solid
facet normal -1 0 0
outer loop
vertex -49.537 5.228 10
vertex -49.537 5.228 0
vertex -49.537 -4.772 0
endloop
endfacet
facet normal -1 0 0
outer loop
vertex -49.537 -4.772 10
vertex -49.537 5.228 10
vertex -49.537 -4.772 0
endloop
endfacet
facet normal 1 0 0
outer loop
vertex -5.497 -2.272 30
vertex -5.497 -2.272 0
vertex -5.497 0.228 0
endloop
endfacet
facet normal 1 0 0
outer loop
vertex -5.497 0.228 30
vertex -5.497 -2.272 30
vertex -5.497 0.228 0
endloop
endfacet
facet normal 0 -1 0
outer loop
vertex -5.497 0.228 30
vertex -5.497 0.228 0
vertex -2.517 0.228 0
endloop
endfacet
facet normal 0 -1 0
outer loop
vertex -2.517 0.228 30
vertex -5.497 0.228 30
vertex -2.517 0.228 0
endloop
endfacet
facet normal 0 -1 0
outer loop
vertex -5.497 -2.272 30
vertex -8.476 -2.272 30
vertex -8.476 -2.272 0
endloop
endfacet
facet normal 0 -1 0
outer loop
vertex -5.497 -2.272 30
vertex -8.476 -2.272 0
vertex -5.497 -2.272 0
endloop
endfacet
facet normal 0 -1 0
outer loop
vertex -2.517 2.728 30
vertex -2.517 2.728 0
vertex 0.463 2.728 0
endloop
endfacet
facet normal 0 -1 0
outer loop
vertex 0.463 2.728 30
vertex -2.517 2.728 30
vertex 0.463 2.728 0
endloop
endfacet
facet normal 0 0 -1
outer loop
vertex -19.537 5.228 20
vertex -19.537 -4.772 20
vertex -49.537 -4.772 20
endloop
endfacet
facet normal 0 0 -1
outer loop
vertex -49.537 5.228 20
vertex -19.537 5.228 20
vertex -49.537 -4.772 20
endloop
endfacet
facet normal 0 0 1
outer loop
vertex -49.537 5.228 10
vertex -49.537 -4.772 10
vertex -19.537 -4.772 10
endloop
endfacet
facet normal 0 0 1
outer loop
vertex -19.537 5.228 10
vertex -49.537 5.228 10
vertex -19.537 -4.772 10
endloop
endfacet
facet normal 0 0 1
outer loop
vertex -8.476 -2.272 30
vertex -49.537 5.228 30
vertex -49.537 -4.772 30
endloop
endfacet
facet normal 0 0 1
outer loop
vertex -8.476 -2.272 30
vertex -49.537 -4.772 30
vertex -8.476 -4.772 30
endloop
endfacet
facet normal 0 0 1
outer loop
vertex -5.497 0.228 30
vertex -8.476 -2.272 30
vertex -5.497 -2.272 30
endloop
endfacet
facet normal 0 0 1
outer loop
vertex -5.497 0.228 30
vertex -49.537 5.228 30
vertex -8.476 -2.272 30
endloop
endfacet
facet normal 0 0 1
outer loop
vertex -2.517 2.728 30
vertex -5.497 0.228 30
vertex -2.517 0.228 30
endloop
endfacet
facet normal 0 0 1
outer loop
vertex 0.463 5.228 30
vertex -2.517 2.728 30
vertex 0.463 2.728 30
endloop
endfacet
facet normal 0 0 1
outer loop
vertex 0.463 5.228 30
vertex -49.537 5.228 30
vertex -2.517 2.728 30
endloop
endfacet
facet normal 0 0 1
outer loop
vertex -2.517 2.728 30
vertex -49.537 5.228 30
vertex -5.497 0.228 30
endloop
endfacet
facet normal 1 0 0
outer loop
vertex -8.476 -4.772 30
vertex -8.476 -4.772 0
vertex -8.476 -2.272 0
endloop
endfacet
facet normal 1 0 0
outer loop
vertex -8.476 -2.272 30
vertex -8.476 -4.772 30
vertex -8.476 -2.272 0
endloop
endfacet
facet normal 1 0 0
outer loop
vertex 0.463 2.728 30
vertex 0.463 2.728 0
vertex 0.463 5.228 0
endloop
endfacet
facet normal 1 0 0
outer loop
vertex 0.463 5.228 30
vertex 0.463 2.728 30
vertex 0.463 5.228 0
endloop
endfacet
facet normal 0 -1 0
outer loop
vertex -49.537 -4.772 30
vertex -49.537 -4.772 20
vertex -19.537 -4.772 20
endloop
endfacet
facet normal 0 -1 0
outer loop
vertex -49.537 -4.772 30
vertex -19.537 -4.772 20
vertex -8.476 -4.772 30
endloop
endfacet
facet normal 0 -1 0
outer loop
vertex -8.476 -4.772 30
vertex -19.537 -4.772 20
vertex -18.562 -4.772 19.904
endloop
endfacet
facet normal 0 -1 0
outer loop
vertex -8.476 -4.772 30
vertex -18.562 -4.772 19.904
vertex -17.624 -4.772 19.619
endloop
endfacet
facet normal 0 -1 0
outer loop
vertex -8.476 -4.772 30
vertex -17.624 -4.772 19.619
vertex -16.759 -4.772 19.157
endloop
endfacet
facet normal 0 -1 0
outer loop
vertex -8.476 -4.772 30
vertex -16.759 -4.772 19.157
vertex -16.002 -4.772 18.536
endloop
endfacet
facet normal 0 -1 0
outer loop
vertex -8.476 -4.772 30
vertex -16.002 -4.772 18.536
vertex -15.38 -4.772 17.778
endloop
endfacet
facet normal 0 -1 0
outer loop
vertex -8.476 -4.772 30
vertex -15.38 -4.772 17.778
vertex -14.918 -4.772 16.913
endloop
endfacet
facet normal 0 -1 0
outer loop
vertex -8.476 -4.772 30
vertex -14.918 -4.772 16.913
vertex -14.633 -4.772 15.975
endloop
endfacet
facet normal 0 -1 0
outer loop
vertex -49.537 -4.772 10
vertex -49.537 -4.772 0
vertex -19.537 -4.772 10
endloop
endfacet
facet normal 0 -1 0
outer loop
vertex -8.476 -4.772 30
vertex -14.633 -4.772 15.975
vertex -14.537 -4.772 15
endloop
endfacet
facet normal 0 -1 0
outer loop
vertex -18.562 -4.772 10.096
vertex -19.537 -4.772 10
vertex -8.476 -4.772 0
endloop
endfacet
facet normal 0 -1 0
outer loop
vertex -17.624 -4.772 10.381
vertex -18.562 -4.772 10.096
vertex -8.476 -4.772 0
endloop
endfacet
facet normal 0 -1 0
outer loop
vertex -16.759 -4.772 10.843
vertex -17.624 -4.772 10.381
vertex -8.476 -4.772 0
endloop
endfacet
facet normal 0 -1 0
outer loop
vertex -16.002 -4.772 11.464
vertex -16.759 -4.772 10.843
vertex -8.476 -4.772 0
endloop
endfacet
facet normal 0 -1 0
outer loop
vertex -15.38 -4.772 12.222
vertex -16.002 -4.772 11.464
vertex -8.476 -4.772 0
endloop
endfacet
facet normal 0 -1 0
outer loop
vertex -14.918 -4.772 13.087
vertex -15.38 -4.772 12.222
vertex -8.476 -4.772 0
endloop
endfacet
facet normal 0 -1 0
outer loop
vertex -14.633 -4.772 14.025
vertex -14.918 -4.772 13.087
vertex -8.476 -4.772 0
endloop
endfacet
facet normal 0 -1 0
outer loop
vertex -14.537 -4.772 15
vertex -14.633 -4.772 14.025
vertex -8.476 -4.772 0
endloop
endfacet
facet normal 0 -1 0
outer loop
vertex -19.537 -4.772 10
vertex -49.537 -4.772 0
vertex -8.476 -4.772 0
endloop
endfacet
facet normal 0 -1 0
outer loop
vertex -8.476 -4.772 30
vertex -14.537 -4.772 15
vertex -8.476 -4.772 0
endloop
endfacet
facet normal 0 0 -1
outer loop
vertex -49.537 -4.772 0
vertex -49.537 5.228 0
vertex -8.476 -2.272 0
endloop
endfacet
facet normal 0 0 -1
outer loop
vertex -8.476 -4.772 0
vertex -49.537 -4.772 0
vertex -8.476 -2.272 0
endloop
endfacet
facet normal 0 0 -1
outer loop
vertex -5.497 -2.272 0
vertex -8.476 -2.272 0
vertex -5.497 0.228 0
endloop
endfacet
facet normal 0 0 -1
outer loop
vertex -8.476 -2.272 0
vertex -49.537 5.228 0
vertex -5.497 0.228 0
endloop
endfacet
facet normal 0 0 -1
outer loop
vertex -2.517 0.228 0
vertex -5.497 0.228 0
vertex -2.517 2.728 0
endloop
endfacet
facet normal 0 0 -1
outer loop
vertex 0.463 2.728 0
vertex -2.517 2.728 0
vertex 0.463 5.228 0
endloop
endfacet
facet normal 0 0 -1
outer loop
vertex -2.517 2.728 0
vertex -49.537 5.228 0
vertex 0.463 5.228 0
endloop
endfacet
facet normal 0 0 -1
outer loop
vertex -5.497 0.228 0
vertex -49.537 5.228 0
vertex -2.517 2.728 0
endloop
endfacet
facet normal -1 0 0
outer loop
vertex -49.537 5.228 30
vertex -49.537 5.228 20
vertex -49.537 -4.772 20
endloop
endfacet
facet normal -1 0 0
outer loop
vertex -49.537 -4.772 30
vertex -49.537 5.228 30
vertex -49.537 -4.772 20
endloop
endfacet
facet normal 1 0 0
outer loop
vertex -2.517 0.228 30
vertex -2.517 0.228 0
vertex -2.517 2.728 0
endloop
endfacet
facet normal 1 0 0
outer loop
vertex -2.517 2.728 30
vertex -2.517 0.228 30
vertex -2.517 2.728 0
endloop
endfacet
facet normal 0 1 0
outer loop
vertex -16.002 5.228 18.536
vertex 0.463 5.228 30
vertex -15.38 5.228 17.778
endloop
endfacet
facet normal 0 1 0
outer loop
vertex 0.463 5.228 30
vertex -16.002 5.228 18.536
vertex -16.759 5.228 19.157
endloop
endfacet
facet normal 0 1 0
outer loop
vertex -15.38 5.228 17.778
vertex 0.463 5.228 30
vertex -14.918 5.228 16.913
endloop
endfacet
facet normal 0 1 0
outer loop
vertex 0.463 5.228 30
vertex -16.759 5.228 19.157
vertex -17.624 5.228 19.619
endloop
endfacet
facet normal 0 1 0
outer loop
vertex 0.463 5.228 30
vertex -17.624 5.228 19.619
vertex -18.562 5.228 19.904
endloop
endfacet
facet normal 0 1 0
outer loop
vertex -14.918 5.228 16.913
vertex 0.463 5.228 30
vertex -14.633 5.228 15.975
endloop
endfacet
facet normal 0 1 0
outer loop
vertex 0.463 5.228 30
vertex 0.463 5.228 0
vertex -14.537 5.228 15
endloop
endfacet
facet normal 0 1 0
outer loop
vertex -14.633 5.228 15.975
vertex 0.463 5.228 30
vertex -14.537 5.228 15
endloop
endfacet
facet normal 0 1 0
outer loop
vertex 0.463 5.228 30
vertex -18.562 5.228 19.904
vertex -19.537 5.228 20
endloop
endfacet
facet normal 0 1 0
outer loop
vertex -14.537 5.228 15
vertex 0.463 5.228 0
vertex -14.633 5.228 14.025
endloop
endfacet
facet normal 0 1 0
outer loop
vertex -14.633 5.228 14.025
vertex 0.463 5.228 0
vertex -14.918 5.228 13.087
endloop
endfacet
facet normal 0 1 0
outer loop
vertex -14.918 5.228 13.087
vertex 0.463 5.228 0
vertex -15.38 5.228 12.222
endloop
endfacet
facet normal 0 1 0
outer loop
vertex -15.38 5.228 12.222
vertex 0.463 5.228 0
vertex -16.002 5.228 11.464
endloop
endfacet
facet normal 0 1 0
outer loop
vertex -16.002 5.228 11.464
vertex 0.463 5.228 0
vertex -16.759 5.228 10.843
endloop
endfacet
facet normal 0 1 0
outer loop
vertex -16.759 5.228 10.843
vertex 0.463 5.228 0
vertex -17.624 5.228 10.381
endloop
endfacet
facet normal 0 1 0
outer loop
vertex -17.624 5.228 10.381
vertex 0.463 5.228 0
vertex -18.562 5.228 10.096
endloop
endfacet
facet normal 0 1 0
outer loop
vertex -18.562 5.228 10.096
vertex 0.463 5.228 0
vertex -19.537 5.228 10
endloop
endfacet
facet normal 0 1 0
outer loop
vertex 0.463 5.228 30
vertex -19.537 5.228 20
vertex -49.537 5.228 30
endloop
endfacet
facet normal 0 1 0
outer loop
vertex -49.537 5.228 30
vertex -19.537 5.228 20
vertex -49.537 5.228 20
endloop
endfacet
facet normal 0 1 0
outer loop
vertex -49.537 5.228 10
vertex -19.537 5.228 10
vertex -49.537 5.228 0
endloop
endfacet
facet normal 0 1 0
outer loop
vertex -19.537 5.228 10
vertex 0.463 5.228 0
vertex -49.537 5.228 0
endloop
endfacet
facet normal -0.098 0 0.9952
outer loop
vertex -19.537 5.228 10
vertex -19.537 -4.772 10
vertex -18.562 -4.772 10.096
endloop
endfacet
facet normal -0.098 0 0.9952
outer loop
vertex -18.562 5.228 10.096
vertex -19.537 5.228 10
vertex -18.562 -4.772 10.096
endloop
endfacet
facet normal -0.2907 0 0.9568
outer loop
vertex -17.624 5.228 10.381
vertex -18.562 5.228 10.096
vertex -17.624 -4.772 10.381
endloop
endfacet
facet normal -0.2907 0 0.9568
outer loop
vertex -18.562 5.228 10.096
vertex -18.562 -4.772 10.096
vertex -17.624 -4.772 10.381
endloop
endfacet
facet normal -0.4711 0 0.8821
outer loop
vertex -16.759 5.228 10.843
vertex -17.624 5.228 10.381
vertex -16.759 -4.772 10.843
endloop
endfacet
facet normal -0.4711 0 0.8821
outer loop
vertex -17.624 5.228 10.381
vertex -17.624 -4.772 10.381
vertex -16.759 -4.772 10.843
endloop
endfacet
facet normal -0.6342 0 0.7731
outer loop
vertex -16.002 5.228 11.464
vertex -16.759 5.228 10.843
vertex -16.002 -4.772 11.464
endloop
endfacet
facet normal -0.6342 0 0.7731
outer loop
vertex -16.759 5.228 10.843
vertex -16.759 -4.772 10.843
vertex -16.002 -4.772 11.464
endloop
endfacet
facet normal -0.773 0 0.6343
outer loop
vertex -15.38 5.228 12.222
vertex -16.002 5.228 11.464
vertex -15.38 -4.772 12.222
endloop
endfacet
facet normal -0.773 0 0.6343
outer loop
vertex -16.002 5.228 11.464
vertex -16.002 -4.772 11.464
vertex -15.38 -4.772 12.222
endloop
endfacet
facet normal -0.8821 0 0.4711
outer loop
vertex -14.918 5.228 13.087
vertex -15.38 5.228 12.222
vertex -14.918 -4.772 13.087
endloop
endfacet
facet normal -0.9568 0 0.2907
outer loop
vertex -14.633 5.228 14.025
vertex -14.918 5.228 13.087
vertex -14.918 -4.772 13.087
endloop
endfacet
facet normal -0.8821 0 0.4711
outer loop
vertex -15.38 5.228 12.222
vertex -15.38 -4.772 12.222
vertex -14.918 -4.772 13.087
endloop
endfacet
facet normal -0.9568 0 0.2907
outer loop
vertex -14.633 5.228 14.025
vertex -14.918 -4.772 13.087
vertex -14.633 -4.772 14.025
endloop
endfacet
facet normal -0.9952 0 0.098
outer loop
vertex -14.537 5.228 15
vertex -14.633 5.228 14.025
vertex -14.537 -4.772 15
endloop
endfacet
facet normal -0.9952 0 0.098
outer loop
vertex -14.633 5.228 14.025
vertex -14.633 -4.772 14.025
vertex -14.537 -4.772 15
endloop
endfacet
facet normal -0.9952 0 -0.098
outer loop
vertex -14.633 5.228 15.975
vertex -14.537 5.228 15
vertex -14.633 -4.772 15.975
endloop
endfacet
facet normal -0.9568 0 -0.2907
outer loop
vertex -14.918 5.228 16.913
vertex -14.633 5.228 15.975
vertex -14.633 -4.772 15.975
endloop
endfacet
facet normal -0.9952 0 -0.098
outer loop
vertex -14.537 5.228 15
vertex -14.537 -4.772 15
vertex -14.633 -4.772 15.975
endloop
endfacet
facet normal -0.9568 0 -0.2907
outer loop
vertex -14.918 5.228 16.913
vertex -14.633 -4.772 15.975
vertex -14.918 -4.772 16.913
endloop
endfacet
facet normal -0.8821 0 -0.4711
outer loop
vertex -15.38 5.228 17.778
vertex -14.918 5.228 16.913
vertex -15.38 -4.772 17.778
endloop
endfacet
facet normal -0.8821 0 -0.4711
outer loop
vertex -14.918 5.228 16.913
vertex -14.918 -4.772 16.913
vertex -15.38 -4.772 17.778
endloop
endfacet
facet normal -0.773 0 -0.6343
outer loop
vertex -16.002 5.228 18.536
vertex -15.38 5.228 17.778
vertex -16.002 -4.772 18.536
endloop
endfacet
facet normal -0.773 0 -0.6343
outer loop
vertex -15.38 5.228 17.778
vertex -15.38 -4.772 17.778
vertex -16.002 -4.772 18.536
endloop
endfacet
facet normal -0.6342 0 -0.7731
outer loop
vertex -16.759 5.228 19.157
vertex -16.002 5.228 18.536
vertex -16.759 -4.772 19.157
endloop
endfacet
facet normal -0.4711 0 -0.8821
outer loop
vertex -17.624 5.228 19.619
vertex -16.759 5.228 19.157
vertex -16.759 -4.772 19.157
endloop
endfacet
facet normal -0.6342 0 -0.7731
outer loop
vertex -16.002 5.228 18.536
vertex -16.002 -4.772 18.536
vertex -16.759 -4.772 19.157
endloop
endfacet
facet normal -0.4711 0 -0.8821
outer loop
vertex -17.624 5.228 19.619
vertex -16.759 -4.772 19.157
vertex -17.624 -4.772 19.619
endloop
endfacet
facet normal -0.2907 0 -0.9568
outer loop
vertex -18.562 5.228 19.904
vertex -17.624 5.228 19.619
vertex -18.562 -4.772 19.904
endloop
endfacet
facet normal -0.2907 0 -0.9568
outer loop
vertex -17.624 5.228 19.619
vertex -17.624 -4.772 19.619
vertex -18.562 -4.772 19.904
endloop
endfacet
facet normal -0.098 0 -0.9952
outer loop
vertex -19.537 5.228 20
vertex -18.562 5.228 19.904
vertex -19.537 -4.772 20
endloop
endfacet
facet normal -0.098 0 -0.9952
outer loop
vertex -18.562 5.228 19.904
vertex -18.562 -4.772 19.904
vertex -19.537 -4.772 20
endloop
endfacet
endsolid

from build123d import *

# Parameters (mm, degrees)
BOSS_EXTRU_1_DEPTH      = 30
ENL_V_MAT_EXTRU_1_DEPTH = 11


with BuildPart() as part:
    # Esquisse1 → Boss.-Extru.1 (new body)
    with BuildSketch(Plane.XY):
        Polygon((-8.475934619, -4.771699816), (-8.475934619, -2.271699816), (-5.496550637, -2.271699816), (-5.496550637, 0.228300184), (-2.517166656, 0.228300184), (-2.517166656, 2.728300184), (0.462833344, 2.728300184), (0.462833344, 5.228300184), (-49.537166656, 5.228300184), (-49.537166656, -4.771699816), align=None)
    extrude(amount=BOSS_EXTRU_1_DEPTH)

    # Esquisse2 → Enlèv. mat.-Extru.1 (cut, through all)
    with BuildSketch(Plane.XZ.offset(4.771699816)):
        with BuildLine():
            Line((-167.240462798, 10), (-49.537166656, 10))
            Line((-49.537166656, 10), (-19.537166656, 10))
            ThreePointArc((-19.537166656, 10), (-14.537166656, 15), (-19.537166656, 20))
            Line((-19.537166656, 20), (-49.537166656, 20))
            Line((-49.537166656, 20), (-167.240462798, 20))
            Line((-167.240462798, 20), (-402.647055084, 20))
            Line((-402.647055084, 20), (-402.647055084, 10))
            Line((-402.647055084, 10), (-167.240462798, 10))
        make_face()
    extrude(amount=-ENL_V_MAT_EXTRU_1_DEPTH, mode=Mode.SUBTRACT)


solid = part.part
